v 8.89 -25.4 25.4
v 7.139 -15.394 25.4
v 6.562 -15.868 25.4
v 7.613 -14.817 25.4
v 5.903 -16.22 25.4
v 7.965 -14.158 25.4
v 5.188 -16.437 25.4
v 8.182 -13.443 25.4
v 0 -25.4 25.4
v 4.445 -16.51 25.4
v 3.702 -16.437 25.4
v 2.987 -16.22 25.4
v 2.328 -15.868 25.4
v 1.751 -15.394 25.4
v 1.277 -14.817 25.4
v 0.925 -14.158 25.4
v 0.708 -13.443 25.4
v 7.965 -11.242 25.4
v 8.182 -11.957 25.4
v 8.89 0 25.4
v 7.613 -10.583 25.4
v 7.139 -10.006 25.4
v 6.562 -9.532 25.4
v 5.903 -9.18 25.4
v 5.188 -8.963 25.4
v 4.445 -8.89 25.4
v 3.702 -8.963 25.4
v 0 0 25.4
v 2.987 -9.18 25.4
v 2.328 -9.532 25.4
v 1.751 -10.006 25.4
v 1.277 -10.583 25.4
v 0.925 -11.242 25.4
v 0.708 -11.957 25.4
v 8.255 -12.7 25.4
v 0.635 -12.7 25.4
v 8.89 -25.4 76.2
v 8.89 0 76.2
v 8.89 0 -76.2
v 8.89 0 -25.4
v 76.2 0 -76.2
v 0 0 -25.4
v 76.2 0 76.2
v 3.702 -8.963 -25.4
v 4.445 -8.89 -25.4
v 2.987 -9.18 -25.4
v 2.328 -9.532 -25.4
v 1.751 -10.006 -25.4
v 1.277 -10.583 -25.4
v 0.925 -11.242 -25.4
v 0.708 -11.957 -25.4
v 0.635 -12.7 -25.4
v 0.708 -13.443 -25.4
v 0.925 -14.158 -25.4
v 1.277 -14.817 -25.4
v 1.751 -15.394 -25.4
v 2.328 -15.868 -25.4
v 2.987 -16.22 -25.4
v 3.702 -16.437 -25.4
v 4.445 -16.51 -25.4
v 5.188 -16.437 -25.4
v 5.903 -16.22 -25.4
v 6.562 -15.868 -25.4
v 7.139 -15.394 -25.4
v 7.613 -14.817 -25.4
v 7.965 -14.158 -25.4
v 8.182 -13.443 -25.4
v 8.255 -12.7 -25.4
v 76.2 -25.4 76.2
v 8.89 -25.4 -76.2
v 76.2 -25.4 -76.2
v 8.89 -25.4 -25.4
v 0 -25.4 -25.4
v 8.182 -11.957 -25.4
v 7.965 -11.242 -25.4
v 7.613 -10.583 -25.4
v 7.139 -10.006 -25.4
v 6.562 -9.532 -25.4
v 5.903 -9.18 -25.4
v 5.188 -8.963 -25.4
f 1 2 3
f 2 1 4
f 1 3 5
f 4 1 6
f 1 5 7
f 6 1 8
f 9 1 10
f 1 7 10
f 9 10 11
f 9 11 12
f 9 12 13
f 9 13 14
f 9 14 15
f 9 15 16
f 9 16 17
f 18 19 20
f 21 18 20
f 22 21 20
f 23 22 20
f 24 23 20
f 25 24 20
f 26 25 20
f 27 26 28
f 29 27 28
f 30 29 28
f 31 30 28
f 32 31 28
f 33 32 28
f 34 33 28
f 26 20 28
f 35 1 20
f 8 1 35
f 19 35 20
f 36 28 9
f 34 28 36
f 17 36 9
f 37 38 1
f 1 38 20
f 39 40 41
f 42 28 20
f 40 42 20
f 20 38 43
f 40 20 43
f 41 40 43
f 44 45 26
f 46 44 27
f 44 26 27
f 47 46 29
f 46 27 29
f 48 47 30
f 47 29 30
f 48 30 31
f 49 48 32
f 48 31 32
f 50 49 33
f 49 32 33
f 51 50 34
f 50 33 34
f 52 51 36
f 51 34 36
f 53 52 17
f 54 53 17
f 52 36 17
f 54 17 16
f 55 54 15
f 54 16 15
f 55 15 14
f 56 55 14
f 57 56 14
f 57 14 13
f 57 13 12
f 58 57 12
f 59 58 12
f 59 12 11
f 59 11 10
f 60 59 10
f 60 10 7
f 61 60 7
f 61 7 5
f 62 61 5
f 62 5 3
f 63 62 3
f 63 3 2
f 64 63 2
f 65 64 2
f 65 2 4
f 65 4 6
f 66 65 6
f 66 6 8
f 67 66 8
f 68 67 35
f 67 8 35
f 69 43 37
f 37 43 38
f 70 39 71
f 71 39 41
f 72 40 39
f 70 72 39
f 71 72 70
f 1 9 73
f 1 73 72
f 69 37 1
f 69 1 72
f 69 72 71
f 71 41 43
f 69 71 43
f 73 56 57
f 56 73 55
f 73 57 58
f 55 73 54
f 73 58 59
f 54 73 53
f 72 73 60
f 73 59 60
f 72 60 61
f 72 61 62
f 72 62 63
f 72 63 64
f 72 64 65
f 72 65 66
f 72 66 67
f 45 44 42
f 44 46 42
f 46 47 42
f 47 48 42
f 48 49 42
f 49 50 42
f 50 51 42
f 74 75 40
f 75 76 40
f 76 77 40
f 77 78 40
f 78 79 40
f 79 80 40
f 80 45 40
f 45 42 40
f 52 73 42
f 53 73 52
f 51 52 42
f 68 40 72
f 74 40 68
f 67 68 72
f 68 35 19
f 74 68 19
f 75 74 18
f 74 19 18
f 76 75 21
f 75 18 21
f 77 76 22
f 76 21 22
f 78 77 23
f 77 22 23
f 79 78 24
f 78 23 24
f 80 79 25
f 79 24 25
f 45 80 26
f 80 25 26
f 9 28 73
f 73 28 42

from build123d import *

# Parameters (mm, degrees)
F1_DEPTH = 25.4
F3_DEPTH = 101.601


with BuildPart() as f1:
    # F0 (on Front) → F1 (new body)
    with BuildSketch(Plane.XZ):
        Polygon((0, 25.4), (0, 0), (0, -25.4), (8.89, -25.4), (8.89, -76.2), (76.2, -76.2), (76.2, 76.2), (8.89, 76.2), (8.89, 25.4), align=None)
    extrude(amount=F1_DEPTH)

    # F2 (on face) → F3 (cut, through all)
    with BuildSketch(Plane.XY.offset(25.4)):
        with BuildLine():
            ThreePointArc((8.255, -12.7), (7.139077, -10.005923), (4.445, -8.89))
            ThreePointArc((4.445, -8.89), (1.750923, -15.394077), (8.255, -12.7))
        make_face()
    extrude(amount=-F3_DEPTH, mode=Mode.SUBTRACT)


solid = f1.part
